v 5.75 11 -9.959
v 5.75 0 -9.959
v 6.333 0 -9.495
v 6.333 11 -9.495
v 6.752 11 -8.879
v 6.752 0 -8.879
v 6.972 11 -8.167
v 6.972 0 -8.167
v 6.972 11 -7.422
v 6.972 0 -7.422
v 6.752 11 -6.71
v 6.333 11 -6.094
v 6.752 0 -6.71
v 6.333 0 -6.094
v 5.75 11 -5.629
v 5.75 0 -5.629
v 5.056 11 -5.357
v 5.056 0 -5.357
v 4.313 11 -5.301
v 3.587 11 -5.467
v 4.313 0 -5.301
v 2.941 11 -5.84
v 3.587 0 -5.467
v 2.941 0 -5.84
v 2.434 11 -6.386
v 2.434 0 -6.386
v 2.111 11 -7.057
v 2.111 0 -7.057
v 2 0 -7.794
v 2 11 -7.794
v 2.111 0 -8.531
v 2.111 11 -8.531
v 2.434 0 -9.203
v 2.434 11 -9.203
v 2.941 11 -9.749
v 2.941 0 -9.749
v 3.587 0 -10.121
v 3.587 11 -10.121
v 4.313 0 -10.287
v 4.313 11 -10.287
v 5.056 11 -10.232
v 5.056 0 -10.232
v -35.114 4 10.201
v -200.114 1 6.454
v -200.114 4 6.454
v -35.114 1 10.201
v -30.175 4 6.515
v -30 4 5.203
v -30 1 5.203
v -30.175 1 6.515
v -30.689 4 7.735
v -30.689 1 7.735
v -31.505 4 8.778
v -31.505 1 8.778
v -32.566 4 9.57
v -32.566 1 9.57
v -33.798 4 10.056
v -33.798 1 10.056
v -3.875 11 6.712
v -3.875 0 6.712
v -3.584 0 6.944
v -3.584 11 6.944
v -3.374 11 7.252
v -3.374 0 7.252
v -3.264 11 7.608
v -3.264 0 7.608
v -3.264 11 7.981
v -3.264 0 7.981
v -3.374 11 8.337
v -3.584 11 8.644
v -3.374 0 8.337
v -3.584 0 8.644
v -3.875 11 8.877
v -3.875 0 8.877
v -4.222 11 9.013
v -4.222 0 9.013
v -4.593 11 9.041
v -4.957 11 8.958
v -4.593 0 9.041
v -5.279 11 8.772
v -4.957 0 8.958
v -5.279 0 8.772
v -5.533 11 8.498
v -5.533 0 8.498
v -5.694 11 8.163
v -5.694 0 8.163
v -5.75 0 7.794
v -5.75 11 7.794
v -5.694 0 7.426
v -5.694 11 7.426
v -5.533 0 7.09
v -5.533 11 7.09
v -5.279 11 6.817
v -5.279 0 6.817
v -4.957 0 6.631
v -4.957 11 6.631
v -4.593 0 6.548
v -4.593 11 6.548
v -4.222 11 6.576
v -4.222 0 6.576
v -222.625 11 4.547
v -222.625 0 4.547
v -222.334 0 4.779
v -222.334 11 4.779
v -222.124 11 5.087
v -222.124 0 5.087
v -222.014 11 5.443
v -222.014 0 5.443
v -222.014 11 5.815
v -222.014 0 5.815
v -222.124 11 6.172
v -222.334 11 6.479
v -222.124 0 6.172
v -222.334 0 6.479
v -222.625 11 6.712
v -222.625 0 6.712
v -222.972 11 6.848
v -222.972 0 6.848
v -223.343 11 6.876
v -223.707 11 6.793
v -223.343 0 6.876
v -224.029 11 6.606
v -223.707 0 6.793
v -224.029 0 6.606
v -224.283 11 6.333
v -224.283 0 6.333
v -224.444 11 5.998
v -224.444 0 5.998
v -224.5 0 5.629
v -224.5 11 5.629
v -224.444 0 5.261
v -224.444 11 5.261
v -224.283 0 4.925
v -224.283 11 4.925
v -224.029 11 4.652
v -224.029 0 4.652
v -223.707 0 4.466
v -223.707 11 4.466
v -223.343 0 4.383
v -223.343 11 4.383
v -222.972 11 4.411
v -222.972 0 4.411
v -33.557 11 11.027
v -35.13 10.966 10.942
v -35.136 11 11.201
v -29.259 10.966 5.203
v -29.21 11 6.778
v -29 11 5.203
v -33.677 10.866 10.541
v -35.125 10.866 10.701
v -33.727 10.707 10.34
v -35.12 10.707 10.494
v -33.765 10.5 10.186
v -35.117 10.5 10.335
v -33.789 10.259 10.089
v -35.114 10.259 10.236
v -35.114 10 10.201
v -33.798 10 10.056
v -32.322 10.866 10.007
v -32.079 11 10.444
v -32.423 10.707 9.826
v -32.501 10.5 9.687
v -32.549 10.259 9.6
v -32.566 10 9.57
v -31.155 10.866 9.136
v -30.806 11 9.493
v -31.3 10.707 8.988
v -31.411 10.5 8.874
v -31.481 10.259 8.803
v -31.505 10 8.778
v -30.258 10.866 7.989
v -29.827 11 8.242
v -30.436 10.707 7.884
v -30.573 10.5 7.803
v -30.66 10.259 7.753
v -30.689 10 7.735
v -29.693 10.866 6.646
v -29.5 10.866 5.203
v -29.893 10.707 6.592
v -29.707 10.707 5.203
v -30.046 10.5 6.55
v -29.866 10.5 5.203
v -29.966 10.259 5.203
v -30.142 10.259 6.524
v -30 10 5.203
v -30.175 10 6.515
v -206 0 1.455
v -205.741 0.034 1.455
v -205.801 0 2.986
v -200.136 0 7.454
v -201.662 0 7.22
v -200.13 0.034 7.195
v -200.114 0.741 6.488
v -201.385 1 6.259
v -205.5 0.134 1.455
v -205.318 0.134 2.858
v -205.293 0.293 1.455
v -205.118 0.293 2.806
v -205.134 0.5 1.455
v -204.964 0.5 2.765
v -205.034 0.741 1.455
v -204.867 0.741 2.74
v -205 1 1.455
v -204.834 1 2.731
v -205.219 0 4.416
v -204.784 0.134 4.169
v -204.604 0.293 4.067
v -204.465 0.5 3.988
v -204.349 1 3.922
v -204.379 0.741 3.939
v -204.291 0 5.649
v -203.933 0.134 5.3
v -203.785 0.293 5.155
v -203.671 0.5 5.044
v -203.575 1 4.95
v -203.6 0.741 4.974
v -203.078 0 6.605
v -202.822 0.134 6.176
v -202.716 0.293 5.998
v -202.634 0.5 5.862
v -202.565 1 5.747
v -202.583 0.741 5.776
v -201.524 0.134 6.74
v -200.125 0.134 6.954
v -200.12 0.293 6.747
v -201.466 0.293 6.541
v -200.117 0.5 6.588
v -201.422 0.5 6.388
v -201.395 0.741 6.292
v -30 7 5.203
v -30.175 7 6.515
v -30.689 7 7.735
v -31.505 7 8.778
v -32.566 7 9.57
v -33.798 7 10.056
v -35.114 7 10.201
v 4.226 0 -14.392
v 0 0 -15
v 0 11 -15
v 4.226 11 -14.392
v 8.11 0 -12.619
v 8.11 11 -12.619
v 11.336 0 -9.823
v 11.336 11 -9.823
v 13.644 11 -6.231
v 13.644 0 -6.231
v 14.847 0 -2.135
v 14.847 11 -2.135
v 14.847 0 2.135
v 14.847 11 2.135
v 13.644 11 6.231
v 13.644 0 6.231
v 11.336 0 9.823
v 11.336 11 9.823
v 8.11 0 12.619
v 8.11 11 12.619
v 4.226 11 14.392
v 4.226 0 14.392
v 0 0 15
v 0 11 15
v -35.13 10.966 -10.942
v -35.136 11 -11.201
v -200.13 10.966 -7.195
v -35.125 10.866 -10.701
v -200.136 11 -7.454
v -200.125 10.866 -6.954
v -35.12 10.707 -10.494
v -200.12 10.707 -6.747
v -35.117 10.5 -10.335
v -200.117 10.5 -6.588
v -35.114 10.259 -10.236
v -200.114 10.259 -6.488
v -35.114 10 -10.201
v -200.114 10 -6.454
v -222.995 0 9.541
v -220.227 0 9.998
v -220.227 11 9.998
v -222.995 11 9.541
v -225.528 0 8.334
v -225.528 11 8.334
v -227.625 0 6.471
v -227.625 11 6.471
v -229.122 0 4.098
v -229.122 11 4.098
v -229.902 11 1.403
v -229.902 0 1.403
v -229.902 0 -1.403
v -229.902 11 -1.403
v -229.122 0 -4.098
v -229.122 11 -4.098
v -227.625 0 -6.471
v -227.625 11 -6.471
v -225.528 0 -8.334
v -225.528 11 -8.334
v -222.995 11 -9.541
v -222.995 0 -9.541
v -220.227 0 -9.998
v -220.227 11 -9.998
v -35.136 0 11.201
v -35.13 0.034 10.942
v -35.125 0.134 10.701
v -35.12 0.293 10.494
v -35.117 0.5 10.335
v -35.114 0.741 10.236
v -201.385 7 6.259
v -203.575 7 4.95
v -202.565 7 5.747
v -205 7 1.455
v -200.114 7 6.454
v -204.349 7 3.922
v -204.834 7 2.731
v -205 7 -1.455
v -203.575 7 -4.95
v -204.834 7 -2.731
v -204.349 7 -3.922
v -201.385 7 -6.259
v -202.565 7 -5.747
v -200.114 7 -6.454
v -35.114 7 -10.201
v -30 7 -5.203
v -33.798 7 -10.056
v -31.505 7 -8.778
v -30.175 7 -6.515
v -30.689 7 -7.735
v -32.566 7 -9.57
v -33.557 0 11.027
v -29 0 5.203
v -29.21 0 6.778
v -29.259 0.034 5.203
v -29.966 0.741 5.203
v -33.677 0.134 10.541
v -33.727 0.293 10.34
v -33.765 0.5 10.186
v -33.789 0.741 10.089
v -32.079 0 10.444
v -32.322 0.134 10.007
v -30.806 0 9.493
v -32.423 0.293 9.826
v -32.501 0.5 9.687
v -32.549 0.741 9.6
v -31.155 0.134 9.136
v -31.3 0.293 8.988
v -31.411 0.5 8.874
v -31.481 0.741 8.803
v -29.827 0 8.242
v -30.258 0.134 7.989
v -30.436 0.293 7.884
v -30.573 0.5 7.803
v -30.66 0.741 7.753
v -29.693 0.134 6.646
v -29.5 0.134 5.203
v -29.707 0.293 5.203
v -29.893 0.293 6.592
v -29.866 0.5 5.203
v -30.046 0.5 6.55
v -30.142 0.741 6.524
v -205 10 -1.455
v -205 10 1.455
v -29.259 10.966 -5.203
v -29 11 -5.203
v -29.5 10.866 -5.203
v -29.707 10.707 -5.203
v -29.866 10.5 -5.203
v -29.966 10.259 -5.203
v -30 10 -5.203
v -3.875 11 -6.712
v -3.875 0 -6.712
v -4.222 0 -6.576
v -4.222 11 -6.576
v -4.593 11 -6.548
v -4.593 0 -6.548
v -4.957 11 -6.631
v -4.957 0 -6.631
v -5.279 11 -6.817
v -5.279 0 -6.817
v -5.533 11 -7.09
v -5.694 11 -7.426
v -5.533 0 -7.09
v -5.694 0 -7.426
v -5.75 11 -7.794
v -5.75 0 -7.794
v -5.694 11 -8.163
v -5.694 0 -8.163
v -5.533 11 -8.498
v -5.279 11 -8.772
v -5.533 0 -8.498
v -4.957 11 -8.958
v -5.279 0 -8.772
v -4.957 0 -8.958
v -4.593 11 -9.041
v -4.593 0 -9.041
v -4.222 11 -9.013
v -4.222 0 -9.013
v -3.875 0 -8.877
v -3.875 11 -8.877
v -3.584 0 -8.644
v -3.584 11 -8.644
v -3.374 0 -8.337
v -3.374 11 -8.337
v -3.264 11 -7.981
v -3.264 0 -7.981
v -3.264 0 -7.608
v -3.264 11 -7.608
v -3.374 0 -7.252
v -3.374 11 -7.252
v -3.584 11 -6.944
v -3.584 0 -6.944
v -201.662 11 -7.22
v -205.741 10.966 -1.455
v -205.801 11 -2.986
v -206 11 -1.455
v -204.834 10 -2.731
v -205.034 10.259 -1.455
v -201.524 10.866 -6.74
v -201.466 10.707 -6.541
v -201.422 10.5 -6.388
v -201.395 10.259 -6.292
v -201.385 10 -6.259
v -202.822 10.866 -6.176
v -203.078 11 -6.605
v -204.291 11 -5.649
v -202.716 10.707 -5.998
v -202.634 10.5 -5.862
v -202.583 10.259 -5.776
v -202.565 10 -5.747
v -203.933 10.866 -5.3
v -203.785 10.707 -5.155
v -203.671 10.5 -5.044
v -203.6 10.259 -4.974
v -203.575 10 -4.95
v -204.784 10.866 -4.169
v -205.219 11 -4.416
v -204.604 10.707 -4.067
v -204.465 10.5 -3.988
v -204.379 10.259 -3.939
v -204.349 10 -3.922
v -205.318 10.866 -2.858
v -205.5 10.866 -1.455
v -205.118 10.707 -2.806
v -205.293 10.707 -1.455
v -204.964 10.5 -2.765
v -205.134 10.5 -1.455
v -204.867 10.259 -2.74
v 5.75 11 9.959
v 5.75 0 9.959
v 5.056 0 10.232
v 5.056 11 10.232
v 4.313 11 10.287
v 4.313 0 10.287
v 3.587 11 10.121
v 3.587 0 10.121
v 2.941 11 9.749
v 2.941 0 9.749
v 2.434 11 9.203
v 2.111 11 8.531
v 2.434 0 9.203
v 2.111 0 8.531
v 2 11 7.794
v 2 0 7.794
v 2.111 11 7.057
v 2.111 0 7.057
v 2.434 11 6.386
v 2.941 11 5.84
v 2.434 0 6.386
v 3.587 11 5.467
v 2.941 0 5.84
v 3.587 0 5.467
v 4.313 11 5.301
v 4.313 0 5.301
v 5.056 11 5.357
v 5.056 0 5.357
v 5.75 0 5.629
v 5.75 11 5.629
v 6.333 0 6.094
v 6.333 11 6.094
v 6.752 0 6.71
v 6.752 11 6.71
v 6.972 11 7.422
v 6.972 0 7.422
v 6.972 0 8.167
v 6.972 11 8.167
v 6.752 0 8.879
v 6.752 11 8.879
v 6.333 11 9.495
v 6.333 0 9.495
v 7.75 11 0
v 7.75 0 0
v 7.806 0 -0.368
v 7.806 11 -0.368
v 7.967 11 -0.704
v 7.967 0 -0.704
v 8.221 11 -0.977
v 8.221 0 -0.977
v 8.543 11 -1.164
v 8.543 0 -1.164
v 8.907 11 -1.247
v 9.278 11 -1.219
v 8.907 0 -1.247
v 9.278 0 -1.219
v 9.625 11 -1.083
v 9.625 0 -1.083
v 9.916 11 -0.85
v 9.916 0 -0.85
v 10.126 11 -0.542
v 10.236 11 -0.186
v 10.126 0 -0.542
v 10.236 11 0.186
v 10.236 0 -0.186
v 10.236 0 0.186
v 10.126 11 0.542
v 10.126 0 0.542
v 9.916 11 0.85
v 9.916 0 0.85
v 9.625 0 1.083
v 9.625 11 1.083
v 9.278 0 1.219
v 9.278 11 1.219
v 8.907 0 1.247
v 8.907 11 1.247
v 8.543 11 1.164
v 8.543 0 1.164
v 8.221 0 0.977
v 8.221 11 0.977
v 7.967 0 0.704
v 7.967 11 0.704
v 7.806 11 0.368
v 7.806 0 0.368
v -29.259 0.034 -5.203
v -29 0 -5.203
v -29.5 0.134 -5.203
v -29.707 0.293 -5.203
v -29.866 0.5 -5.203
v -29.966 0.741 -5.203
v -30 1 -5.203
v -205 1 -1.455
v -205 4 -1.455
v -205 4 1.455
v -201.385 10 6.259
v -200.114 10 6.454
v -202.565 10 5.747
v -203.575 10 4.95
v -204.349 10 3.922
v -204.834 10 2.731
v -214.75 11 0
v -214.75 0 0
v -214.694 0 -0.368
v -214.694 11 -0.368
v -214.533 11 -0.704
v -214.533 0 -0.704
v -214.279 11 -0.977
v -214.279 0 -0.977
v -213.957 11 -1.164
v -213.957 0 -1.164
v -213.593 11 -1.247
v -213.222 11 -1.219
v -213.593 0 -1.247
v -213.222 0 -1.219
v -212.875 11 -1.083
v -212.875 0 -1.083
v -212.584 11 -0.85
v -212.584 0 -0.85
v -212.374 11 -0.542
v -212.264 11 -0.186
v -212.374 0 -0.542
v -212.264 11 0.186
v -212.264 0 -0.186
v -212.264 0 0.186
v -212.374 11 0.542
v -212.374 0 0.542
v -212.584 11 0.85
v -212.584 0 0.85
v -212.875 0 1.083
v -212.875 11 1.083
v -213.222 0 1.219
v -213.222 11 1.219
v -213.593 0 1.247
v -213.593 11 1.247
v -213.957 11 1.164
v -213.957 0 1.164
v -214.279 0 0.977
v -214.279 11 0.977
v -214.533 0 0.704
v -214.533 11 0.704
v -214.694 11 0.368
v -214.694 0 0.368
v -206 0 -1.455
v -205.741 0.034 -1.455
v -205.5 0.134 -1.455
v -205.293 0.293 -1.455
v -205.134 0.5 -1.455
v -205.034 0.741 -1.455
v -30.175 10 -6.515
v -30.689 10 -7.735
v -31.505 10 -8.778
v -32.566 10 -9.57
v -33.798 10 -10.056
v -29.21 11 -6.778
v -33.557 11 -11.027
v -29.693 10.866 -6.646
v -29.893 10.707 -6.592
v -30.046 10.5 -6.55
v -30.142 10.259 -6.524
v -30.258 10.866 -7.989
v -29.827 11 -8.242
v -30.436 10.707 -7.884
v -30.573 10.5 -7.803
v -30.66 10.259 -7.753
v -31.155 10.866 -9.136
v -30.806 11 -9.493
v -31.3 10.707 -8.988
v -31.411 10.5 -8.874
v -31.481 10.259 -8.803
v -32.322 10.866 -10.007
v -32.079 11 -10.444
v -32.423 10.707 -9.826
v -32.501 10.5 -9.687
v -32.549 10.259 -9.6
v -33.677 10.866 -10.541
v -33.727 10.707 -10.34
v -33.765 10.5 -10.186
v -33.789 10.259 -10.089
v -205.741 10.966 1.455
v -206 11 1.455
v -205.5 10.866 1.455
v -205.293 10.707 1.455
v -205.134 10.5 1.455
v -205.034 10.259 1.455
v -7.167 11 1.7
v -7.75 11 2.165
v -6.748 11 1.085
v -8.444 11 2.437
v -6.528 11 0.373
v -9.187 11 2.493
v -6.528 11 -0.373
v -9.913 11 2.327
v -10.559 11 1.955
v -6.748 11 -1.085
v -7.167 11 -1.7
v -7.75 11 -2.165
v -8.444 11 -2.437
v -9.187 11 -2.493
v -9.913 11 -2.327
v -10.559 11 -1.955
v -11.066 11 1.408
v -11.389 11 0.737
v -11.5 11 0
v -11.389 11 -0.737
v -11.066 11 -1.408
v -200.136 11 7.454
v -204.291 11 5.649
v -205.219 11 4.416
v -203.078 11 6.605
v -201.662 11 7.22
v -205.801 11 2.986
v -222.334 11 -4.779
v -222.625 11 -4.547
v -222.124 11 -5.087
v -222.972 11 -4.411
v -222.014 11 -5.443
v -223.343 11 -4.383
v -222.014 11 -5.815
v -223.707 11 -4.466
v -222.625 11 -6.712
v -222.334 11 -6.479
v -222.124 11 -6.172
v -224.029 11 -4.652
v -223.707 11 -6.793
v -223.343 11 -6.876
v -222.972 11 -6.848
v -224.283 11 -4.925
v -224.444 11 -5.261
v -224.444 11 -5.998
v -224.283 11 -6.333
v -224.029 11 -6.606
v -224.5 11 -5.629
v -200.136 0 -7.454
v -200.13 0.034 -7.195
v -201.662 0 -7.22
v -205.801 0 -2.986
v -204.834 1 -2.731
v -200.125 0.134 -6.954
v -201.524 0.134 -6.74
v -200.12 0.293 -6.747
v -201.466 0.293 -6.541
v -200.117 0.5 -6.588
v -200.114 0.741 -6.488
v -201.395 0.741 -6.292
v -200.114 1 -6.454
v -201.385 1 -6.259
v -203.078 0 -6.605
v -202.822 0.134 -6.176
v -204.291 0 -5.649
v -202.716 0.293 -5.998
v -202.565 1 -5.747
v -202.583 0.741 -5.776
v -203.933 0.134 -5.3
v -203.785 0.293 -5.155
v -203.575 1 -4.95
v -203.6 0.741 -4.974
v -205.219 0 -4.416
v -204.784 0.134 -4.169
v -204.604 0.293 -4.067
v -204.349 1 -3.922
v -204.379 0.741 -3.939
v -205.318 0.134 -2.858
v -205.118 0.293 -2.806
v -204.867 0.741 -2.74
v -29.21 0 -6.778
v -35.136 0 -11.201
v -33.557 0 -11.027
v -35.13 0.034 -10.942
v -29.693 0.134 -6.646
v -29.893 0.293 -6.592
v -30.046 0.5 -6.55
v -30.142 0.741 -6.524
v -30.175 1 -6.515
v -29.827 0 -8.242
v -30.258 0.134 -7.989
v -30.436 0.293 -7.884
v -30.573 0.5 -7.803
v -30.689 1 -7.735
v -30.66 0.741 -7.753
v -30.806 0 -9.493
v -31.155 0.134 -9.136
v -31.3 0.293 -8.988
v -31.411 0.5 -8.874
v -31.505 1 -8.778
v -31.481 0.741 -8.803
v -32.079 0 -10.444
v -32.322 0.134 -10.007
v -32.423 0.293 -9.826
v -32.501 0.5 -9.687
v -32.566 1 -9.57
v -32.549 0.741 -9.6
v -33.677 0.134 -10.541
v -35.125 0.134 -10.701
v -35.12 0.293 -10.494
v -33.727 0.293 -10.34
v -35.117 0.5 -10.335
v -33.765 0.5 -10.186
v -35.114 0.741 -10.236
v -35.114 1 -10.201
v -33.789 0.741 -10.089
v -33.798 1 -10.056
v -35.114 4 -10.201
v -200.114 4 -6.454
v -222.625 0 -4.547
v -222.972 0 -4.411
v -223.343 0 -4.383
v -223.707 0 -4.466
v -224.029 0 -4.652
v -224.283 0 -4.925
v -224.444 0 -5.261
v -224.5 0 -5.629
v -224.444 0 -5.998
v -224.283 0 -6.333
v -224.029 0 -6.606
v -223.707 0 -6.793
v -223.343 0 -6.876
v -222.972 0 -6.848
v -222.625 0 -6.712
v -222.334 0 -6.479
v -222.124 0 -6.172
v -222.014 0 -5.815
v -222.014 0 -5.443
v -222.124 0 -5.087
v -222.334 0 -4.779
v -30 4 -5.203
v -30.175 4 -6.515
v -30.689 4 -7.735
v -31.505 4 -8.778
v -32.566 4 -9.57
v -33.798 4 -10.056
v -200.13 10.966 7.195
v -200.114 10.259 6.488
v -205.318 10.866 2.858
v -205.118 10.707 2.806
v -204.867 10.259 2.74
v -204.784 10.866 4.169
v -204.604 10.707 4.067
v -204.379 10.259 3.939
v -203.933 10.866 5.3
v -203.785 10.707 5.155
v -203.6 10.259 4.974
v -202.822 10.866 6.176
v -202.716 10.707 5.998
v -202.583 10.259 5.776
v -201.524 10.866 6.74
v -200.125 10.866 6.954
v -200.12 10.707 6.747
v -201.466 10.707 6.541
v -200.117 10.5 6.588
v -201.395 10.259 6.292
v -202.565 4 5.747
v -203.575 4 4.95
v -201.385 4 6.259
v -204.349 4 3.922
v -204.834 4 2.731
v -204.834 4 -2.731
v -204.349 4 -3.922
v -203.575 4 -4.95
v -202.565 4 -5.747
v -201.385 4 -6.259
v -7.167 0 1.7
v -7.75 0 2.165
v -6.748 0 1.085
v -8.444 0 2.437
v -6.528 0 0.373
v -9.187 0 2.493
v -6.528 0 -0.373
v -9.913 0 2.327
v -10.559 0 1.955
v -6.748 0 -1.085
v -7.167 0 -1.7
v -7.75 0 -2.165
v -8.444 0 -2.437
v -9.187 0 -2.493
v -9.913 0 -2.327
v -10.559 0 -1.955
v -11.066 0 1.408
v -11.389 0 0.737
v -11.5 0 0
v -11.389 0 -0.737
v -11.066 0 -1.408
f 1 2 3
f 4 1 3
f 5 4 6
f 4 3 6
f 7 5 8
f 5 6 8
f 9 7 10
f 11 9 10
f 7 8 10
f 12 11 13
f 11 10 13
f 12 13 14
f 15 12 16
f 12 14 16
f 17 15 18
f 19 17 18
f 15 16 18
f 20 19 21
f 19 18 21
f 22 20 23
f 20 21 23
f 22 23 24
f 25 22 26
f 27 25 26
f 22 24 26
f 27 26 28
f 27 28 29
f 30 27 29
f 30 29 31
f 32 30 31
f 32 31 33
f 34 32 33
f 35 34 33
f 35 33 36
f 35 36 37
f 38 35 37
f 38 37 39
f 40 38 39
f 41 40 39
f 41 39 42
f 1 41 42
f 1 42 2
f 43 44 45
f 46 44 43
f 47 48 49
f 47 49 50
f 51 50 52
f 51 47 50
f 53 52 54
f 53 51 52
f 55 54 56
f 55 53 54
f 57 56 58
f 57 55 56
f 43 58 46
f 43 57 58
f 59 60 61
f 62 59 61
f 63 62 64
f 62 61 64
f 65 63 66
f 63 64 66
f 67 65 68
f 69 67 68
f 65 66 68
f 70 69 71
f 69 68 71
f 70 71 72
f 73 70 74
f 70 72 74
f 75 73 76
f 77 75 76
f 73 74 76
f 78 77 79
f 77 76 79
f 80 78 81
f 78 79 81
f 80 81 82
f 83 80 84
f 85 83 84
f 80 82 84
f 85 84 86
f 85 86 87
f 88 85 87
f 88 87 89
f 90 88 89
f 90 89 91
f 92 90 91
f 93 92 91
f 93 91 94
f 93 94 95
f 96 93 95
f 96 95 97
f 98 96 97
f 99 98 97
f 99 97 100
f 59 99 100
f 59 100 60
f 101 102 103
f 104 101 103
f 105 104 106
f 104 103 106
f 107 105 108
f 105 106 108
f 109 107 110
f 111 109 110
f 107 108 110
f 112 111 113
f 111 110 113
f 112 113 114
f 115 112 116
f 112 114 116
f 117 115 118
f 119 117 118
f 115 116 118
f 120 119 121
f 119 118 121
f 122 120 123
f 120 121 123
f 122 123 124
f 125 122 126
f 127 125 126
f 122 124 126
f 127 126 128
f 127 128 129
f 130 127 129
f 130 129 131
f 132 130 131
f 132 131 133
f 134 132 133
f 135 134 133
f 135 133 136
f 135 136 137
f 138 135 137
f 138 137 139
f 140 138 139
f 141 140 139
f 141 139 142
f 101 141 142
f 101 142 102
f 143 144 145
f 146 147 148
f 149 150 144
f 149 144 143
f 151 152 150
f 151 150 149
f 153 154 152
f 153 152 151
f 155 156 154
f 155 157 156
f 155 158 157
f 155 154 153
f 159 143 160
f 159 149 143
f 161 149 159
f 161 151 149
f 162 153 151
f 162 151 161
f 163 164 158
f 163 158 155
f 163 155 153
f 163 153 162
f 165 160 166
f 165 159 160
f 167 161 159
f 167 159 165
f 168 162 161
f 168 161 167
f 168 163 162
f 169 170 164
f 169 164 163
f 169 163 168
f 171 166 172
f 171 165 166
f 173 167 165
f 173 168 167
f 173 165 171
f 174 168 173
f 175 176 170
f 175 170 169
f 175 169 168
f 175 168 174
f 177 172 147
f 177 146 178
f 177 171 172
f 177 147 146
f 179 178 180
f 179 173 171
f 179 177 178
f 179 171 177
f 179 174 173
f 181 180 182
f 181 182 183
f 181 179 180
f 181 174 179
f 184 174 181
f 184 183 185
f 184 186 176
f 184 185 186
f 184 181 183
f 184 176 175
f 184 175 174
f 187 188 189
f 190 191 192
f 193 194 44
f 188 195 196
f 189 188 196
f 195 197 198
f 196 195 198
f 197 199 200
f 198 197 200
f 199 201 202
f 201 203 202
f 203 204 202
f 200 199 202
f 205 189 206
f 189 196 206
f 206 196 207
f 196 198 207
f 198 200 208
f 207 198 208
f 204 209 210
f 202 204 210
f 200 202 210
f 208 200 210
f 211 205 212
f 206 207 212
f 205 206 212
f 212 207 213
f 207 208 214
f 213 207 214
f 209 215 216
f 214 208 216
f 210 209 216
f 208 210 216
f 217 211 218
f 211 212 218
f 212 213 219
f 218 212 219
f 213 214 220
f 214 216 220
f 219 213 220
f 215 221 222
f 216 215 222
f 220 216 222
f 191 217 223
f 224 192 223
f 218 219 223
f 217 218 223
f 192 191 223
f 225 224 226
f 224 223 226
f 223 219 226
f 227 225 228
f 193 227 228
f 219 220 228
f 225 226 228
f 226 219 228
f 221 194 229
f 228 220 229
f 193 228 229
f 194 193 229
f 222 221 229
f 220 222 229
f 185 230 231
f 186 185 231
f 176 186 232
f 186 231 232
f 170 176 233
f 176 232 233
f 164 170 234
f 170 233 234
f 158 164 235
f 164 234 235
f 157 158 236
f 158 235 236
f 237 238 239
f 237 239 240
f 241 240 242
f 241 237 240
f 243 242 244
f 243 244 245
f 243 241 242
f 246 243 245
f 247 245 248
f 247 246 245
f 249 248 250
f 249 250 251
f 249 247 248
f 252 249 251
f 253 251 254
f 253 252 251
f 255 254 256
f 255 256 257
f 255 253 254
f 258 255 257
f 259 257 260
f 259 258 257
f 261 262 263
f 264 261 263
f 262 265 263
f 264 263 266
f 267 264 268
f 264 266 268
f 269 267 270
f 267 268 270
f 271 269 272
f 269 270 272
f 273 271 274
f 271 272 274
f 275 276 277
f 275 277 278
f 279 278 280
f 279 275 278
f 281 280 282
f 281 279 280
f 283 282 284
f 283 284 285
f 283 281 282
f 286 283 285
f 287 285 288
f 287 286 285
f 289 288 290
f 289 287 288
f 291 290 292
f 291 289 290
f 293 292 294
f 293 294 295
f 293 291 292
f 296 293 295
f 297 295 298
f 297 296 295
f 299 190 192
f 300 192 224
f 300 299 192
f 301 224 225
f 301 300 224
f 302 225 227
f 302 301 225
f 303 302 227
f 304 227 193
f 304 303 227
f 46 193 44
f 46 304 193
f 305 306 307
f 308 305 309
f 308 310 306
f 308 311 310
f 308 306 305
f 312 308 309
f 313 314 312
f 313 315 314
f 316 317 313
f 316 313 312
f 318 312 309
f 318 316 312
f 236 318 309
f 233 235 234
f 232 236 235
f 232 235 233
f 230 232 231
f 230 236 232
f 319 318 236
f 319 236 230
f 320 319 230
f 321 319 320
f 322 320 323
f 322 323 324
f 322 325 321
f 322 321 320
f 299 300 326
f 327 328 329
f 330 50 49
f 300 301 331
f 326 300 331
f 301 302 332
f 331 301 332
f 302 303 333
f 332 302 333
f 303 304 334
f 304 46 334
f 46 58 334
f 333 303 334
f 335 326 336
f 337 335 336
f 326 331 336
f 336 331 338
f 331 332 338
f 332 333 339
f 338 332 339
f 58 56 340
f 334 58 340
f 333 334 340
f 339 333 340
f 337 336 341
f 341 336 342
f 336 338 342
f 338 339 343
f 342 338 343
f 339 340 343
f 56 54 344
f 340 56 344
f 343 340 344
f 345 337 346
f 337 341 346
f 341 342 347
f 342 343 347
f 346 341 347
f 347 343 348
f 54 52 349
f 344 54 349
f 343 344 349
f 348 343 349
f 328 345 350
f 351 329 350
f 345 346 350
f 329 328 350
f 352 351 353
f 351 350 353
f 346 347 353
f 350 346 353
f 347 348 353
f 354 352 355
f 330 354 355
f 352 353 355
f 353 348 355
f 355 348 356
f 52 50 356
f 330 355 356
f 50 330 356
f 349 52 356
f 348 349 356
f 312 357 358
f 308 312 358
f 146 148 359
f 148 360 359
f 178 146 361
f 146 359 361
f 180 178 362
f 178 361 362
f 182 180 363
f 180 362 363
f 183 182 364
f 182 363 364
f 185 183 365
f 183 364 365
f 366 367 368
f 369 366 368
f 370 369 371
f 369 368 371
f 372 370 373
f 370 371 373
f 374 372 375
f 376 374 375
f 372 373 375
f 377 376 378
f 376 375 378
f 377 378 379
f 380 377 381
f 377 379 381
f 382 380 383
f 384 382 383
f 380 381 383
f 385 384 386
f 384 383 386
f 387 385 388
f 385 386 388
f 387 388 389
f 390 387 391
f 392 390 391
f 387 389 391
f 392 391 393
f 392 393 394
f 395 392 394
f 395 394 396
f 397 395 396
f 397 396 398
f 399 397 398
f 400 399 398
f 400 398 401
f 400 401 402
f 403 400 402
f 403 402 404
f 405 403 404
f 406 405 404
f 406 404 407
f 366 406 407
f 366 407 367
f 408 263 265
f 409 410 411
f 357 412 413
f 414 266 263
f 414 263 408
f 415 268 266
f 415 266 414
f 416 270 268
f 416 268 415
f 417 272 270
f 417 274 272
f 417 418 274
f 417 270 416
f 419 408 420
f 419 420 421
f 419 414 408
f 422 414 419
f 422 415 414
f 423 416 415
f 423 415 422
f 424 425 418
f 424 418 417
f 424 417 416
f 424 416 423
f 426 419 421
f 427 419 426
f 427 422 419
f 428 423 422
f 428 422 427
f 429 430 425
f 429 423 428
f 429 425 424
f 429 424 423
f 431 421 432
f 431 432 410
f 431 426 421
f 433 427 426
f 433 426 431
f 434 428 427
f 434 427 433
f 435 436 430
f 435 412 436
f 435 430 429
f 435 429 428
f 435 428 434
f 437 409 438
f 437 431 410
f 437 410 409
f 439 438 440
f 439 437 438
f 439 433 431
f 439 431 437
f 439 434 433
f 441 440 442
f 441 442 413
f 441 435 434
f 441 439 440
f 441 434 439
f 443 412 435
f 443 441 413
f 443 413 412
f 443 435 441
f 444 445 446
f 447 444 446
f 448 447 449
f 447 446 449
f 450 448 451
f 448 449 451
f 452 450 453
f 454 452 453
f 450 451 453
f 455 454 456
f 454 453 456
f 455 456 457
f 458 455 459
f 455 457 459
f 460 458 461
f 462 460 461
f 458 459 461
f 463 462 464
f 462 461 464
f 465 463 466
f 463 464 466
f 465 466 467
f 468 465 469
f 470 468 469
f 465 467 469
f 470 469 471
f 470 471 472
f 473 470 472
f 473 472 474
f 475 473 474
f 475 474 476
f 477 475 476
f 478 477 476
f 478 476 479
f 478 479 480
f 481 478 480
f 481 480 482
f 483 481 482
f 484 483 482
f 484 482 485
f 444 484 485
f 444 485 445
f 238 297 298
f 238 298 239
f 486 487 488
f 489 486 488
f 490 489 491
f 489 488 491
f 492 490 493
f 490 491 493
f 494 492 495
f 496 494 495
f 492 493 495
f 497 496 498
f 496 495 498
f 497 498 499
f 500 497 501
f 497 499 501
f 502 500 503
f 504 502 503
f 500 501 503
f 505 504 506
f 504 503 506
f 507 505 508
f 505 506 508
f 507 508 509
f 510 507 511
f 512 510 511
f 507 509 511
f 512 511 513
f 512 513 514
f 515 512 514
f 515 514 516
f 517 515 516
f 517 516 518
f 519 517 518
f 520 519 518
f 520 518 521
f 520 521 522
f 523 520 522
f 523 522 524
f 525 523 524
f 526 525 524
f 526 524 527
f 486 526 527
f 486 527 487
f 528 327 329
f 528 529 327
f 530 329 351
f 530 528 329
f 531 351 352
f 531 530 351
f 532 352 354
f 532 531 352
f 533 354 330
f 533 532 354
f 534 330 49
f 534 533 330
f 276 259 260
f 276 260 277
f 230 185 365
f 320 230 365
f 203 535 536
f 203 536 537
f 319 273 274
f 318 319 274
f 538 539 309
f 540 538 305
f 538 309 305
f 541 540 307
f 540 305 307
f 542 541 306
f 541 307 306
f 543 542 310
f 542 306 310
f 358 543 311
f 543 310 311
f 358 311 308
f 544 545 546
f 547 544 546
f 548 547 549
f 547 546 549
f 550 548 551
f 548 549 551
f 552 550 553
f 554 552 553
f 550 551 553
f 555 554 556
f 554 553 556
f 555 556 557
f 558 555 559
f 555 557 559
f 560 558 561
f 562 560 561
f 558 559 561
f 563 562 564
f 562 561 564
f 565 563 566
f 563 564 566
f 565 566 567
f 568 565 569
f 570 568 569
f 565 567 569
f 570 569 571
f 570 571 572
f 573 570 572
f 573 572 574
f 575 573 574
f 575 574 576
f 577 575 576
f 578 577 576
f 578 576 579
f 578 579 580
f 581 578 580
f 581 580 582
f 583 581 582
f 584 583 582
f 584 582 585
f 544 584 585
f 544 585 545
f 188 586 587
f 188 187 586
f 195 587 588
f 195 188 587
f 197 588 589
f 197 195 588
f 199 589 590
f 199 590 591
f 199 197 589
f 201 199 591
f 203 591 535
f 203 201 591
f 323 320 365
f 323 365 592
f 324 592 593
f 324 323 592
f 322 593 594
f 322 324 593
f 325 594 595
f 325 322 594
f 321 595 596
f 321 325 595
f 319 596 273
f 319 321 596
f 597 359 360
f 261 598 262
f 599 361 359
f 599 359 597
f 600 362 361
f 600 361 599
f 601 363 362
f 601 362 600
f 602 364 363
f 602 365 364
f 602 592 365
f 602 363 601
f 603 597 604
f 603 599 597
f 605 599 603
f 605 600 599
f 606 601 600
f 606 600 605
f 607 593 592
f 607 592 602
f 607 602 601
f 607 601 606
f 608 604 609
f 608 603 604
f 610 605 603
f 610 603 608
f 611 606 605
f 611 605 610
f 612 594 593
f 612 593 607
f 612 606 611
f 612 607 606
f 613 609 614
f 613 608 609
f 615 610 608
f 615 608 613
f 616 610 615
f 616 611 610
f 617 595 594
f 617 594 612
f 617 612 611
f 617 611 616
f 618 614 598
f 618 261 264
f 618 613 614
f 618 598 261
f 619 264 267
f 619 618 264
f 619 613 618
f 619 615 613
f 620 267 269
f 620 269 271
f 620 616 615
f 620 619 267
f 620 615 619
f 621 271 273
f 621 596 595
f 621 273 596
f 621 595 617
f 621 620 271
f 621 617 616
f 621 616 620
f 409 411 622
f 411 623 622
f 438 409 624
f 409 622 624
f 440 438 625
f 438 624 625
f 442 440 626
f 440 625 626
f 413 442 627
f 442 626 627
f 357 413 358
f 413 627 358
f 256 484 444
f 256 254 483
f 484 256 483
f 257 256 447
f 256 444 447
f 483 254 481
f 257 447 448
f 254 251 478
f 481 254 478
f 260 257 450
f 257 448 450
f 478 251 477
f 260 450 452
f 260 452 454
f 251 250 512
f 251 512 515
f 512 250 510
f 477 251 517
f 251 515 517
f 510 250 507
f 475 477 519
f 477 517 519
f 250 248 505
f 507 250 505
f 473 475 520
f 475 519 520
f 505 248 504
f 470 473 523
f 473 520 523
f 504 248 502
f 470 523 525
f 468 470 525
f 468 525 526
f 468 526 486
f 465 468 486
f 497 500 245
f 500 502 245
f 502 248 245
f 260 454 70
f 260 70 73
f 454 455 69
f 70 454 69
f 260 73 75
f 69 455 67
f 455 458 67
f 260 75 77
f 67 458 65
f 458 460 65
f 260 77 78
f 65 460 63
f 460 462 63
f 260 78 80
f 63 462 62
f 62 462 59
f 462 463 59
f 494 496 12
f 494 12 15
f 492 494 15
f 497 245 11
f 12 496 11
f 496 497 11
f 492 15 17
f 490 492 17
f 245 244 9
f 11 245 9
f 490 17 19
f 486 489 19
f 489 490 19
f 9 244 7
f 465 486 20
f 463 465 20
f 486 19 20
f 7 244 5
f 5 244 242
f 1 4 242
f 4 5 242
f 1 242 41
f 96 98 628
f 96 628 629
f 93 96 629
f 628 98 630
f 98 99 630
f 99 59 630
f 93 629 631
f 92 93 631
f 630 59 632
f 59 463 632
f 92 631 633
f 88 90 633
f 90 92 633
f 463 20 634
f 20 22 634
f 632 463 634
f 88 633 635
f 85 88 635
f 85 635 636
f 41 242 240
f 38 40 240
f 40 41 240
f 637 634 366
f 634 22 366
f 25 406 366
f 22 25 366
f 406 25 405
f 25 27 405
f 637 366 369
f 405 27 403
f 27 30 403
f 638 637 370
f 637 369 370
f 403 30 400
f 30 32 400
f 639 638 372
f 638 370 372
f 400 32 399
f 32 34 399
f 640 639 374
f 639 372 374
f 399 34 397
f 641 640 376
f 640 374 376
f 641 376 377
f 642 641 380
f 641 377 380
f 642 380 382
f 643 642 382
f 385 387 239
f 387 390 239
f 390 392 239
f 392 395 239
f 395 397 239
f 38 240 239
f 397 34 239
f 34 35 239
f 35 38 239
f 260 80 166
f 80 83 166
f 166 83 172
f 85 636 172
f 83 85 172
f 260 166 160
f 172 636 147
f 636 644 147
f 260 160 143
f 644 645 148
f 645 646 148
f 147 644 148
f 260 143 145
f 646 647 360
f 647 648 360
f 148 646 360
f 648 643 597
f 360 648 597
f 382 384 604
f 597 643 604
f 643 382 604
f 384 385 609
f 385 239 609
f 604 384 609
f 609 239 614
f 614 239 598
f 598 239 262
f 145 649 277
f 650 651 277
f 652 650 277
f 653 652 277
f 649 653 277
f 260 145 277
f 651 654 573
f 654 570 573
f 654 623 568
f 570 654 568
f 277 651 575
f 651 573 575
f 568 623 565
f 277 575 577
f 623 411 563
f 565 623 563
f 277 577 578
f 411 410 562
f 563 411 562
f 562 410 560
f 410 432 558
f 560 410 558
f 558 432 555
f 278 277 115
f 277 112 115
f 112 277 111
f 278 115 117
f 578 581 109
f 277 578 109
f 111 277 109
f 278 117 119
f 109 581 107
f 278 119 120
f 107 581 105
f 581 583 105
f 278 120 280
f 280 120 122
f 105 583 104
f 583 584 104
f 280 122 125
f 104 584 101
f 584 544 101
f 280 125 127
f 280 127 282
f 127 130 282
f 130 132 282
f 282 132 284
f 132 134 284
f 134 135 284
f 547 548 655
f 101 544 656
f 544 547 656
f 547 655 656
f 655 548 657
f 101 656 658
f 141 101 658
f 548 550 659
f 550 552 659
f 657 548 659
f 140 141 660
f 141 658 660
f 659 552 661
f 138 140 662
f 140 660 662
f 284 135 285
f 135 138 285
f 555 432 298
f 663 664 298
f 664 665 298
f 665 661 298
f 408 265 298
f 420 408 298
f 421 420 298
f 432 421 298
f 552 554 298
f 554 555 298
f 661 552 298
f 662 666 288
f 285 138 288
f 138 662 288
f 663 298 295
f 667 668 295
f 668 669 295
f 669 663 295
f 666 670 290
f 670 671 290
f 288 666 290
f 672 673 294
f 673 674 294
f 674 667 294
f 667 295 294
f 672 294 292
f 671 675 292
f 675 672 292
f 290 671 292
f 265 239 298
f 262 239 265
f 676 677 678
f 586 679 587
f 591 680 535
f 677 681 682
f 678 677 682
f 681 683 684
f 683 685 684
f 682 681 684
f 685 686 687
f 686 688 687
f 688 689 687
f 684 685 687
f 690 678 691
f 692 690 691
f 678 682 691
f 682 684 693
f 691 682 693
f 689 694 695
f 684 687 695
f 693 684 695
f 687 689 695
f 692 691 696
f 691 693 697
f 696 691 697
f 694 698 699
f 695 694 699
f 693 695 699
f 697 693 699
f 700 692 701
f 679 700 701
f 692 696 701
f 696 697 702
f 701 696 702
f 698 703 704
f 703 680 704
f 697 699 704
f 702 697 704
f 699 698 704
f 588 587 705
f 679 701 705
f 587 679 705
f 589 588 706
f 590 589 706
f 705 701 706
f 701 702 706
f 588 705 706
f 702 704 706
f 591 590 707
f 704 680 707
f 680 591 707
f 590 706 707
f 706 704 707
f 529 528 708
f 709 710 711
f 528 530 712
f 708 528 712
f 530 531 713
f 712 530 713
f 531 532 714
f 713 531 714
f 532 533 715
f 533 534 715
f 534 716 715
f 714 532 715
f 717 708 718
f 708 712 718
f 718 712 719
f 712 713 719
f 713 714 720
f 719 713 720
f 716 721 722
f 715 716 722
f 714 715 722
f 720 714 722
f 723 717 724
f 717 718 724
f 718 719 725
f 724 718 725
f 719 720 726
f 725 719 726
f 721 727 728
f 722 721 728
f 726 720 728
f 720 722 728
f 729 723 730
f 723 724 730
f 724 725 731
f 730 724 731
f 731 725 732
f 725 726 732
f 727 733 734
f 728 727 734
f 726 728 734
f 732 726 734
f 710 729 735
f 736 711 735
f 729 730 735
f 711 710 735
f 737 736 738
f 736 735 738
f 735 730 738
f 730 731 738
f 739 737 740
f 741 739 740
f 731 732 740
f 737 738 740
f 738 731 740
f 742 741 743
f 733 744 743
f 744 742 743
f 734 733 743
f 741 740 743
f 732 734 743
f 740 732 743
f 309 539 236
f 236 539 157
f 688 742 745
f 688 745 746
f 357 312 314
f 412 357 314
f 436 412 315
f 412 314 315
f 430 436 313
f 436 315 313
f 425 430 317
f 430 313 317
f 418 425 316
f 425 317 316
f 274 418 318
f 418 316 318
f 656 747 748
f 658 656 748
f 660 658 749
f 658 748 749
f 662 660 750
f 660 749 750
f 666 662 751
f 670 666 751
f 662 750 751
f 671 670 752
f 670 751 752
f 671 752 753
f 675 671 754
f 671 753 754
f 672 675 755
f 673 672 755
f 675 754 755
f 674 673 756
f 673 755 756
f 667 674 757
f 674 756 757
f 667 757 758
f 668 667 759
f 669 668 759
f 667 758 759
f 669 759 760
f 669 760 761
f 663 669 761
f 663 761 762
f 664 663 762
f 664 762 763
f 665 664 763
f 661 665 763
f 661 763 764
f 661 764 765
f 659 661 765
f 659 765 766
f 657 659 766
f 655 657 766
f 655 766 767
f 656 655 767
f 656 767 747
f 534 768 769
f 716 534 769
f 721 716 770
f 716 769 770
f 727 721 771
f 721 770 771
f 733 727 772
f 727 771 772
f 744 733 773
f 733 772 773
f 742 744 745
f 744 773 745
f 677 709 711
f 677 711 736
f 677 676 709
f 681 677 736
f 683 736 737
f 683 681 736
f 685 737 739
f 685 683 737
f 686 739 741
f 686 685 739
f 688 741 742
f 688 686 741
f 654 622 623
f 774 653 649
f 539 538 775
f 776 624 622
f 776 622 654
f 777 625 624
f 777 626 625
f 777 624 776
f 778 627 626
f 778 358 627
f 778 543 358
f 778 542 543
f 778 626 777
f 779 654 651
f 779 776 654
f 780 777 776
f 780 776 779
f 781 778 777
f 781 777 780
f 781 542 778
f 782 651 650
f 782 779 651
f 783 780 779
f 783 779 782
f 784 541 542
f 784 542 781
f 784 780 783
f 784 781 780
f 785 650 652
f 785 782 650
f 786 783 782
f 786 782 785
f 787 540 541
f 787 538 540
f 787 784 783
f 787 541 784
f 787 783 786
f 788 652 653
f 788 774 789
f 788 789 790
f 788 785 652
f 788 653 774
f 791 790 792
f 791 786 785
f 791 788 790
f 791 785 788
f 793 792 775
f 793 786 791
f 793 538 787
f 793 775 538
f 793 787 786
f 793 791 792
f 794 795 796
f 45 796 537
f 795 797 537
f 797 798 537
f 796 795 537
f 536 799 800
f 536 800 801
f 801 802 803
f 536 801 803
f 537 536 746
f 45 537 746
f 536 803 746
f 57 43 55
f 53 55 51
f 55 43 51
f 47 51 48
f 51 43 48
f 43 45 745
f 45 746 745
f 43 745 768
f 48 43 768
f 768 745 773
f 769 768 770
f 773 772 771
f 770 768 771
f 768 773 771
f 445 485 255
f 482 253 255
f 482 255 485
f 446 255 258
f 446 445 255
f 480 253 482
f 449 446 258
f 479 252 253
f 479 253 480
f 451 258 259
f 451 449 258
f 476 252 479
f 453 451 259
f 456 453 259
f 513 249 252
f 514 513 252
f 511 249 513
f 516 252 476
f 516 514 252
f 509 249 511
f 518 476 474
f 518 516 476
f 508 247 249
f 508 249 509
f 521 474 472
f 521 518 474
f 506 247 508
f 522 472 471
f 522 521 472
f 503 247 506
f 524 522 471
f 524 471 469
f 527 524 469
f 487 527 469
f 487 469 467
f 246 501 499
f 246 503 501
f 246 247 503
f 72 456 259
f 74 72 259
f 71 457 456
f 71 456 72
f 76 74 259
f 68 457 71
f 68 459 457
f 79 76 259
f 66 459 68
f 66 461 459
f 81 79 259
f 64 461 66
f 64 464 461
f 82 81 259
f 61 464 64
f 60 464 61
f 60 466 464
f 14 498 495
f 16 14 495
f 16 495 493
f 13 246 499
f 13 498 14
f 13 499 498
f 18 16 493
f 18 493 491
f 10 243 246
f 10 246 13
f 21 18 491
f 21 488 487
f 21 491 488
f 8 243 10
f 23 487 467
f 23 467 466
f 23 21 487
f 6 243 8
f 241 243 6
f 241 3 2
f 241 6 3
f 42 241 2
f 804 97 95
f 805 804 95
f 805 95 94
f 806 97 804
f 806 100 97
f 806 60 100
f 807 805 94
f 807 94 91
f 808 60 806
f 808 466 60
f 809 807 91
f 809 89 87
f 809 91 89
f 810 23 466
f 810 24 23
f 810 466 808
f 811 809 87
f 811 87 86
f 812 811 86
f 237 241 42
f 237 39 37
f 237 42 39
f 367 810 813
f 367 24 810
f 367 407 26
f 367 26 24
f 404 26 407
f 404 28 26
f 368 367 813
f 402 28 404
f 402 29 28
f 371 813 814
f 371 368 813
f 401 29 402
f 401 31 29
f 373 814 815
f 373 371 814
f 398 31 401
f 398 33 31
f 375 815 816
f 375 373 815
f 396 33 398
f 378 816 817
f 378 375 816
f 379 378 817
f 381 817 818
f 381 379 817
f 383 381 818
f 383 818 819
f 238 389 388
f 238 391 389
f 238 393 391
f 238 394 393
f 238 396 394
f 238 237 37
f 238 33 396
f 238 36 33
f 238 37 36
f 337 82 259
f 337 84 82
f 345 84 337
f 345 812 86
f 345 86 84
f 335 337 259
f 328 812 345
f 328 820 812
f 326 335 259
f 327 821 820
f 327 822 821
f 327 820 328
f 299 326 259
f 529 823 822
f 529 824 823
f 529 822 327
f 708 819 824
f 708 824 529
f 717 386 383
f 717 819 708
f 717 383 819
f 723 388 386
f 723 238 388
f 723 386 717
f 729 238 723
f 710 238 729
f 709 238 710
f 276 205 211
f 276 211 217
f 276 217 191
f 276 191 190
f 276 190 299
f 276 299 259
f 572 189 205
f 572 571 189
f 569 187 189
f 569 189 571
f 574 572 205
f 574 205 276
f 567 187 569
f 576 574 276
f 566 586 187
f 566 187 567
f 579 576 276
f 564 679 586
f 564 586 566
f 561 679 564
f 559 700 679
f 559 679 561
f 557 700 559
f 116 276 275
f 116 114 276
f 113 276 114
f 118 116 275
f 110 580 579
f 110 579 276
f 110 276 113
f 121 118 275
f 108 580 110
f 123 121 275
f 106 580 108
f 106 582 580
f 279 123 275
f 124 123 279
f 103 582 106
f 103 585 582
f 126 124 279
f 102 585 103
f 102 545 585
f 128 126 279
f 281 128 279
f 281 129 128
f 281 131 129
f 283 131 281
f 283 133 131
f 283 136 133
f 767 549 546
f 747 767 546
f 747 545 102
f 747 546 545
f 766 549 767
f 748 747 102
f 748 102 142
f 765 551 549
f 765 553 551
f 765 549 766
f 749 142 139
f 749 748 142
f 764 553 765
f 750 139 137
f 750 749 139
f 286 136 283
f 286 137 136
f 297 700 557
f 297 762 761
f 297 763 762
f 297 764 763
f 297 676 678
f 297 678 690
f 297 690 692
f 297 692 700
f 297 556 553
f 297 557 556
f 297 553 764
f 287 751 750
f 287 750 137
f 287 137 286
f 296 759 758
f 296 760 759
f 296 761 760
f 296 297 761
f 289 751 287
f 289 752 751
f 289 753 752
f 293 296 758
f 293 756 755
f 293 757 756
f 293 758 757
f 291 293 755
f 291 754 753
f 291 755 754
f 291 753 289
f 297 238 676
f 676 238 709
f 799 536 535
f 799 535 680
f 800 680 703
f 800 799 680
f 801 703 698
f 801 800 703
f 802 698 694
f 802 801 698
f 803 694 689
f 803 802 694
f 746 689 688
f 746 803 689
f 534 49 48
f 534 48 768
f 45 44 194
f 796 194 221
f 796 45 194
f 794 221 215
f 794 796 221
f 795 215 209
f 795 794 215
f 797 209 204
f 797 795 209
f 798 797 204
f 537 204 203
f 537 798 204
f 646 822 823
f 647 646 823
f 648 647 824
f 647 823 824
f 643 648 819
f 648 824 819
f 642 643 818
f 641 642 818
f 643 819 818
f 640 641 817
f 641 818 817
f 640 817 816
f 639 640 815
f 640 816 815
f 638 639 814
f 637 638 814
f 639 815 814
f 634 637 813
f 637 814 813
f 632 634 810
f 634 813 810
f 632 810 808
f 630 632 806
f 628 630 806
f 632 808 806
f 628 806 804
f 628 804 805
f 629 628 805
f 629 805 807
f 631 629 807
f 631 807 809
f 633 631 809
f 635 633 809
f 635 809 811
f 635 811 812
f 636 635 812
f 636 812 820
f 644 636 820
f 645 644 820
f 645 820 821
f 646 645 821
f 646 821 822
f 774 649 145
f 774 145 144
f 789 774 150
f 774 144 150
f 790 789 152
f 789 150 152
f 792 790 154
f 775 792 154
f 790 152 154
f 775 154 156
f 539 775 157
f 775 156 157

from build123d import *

# Parameters (mm, degrees)
EXTRUDE_2_DEPTH          = 11
HOLE_WIZARD_M3_1_D       = 2.5
PATTERN_CIRCULAR_2_COUNT = 3
HOLE_WIZARD_M3_2_D       = 2.5
PATTERN_CIRCULAR_4_COUNT = 3
F_5_0MM_2_D              = 5
PATTERN_CIRCULAR_5_COUNT = 3
CUT_EXTRUDE_1_DEPTH      = 4
FILLET_2_R               = 5
FILLET_4_R               = 5
FILLET_5_R               = 1
FILLET_6_R               = 1


with BuildPart() as part:
    # 스케치1 → 보스-돌출2 (new body)
    with BuildSketch(Plane(origin=(0, 0, 0), x_dir=(1, 0, 0), z_dir=(0, 1, 0))):
        with BuildLine():
            Line((0, -15), (-220.227083718, -9.998002197))
            ThreePointArc((-220.227083718, -9.998002197), (-230.000580731, 0), (-220.227083718, 9.998002197))
            Line((-220.227083718, 9.998002197), (0, 15))
            ThreePointArc((0, 15), (15, 0), (0, -15))
        make_face()
    extrude(amount=EXTRUDE_2_DEPTH)

    # M3 탭을 위한 탭 드릴1 (through all)
    with Locations(Plane(origin=(0, 11, 0), x_dir=(1, 0, 0), z_dir=(0, 1, 0))):
        with Locations((9, 0)):
            hole_wizard_m3_1 = Hole(HOLE_WIZARD_M3_1_D / 2)

    # 원형 패턴2: M3 탭을 위한 탭 드릴1 ×3 about axis
    pattern_circular_2_axis = Axis((0, 0, 0), (0, 1, 0))
    for i in range(1, PATTERN_CIRCULAR_2_COUNT):
        add(hole_wizard_m3_1.rotate(pattern_circular_2_axis, i * 360 / PATTERN_CIRCULAR_2_COUNT), mode=Mode.SUBTRACT)

    # M3 탭을 위한 탭 드릴2 (through all)
    with Locations(Plane(origin=(0, 11, 0), x_dir=(1, 0, 0), z_dir=(0, 1, 0))):
        with Locations((-213.5, 0)):
            hole_wizard_m3_2 = Hole(HOLE_WIZARD_M3_2_D / 2)

    # 원형 패턴4: M3 탭을 위한 탭 드릴2 ×3 about axis
    pattern_circular_4_axis = Axis((-220, 0, 0), (0, 1, 0))
    for i in range(1, PATTERN_CIRCULAR_4_COUNT):
        add(hole_wizard_m3_2.rotate(pattern_circular_4_axis, i * 360 / PATTERN_CIRCULAR_4_COUNT), mode=Mode.SUBTRACT)

    # Ø5.0mm 맞춤핀 구멍2 (through all)
    with Locations(Plane(origin=(0, 11, 0), x_dir=(1, 0, 0), z_dir=(0, 1, 0))):
        with Locations((-9, 0)):
            f_5_0mm_2 = Hole(F_5_0MM_2_D / 2)

    # 원형 패턴5: Ø5.0mm 맞춤핀 구멍2 ×3 about axis
    pattern_circular_5_axis = Axis((0, 0, 0), (0, 1, 0))
    for i in range(1, PATTERN_CIRCULAR_5_COUNT):
        add(f_5_0mm_2.rotate(pattern_circular_5_axis, i * 360 / PATTERN_CIRCULAR_5_COUNT), mode=Mode.SUBTRACT)

    # 스케치26 → 컷-돌출1 (cut)
    with BuildSketch(Plane(origin=(0, 11, 0), x_dir=(1, 0, 0), z_dir=(0, 1, 0))):
        Polygon((-30, 10.317581098), (-205, 6.342821951), (-205, -6.342821951), (-30, -10.317581098), align=None)
    cut_extrude_1 = extrude(amount=-CUT_EXTRUDE_1_DEPTH, mode=Mode.SUBTRACT)

    # 필렛2
    fillet_2_edges = [part.edges().sort_by_distance(p)[0] for p in [
        (-30, 9, -10.317581098),
        (-30, 9, 10.317581098),
        (-205, 9, 6.342821951),
        (-205, 9, -6.342821951),
    ]]
    fillet(fillet_2_edges, radius=FILLET_2_R)

    # 대칭 복사4: 컷-돌출1 across plane
    add(cut_extrude_1.mirror(Plane.ZX.offset(5.5)), mode=Mode.SUBTRACT)

    # 필렛4
    fillet_4_edges = [part.edges().sort_by_distance(p)[0] for p in [
        (-30, 2, 10.317581098),
        (-30, 2, -10.317581098),
        (-205, 2, -6.342821951),
        (-205, 2, 6.342821951),
    ]]
    fillet(fillet_4_edges, radius=FILLET_4_R)

    # 필렛5
    fillet_5_edges = [part.edges().sort_by_distance(p)[0] for p in [
        (-205, 0, 0),
        (-117.613535266, 0, 8.327622808),
        (-117.613535266, 0, -8.327622808),
        (-30, 0, 0),
        (-203.575449365, 0, 4.950259607),
        (-203.575449365, 0, -4.950259607),
        (-31.504837366, 0, 8.778176392),
        (-31.504837366, 0, -8.778176392),
    ]]
    fillet(fillet_5_edges, radius=FILLET_5_R)

    # 필렛6
    fillet_6_edges = [part.edges().sort_by_distance(p)[0] for p in [
        (-117.613535266, 11, 8.327622808),
        (-205, 11, 0),
        (-117.613535266, 11, -8.327622808),
        (-30, 11, 0),
        (-203.575449365, 11, 4.950259607),
        (-203.575449365, 11, -4.950259607),
        (-31.504837366, 11, 8.778176392),
        (-31.504837366, 11, -8.778176392),
    ]]
    fillet(fillet_6_edges, radius=FILLET_6_R)


solid = part.part
